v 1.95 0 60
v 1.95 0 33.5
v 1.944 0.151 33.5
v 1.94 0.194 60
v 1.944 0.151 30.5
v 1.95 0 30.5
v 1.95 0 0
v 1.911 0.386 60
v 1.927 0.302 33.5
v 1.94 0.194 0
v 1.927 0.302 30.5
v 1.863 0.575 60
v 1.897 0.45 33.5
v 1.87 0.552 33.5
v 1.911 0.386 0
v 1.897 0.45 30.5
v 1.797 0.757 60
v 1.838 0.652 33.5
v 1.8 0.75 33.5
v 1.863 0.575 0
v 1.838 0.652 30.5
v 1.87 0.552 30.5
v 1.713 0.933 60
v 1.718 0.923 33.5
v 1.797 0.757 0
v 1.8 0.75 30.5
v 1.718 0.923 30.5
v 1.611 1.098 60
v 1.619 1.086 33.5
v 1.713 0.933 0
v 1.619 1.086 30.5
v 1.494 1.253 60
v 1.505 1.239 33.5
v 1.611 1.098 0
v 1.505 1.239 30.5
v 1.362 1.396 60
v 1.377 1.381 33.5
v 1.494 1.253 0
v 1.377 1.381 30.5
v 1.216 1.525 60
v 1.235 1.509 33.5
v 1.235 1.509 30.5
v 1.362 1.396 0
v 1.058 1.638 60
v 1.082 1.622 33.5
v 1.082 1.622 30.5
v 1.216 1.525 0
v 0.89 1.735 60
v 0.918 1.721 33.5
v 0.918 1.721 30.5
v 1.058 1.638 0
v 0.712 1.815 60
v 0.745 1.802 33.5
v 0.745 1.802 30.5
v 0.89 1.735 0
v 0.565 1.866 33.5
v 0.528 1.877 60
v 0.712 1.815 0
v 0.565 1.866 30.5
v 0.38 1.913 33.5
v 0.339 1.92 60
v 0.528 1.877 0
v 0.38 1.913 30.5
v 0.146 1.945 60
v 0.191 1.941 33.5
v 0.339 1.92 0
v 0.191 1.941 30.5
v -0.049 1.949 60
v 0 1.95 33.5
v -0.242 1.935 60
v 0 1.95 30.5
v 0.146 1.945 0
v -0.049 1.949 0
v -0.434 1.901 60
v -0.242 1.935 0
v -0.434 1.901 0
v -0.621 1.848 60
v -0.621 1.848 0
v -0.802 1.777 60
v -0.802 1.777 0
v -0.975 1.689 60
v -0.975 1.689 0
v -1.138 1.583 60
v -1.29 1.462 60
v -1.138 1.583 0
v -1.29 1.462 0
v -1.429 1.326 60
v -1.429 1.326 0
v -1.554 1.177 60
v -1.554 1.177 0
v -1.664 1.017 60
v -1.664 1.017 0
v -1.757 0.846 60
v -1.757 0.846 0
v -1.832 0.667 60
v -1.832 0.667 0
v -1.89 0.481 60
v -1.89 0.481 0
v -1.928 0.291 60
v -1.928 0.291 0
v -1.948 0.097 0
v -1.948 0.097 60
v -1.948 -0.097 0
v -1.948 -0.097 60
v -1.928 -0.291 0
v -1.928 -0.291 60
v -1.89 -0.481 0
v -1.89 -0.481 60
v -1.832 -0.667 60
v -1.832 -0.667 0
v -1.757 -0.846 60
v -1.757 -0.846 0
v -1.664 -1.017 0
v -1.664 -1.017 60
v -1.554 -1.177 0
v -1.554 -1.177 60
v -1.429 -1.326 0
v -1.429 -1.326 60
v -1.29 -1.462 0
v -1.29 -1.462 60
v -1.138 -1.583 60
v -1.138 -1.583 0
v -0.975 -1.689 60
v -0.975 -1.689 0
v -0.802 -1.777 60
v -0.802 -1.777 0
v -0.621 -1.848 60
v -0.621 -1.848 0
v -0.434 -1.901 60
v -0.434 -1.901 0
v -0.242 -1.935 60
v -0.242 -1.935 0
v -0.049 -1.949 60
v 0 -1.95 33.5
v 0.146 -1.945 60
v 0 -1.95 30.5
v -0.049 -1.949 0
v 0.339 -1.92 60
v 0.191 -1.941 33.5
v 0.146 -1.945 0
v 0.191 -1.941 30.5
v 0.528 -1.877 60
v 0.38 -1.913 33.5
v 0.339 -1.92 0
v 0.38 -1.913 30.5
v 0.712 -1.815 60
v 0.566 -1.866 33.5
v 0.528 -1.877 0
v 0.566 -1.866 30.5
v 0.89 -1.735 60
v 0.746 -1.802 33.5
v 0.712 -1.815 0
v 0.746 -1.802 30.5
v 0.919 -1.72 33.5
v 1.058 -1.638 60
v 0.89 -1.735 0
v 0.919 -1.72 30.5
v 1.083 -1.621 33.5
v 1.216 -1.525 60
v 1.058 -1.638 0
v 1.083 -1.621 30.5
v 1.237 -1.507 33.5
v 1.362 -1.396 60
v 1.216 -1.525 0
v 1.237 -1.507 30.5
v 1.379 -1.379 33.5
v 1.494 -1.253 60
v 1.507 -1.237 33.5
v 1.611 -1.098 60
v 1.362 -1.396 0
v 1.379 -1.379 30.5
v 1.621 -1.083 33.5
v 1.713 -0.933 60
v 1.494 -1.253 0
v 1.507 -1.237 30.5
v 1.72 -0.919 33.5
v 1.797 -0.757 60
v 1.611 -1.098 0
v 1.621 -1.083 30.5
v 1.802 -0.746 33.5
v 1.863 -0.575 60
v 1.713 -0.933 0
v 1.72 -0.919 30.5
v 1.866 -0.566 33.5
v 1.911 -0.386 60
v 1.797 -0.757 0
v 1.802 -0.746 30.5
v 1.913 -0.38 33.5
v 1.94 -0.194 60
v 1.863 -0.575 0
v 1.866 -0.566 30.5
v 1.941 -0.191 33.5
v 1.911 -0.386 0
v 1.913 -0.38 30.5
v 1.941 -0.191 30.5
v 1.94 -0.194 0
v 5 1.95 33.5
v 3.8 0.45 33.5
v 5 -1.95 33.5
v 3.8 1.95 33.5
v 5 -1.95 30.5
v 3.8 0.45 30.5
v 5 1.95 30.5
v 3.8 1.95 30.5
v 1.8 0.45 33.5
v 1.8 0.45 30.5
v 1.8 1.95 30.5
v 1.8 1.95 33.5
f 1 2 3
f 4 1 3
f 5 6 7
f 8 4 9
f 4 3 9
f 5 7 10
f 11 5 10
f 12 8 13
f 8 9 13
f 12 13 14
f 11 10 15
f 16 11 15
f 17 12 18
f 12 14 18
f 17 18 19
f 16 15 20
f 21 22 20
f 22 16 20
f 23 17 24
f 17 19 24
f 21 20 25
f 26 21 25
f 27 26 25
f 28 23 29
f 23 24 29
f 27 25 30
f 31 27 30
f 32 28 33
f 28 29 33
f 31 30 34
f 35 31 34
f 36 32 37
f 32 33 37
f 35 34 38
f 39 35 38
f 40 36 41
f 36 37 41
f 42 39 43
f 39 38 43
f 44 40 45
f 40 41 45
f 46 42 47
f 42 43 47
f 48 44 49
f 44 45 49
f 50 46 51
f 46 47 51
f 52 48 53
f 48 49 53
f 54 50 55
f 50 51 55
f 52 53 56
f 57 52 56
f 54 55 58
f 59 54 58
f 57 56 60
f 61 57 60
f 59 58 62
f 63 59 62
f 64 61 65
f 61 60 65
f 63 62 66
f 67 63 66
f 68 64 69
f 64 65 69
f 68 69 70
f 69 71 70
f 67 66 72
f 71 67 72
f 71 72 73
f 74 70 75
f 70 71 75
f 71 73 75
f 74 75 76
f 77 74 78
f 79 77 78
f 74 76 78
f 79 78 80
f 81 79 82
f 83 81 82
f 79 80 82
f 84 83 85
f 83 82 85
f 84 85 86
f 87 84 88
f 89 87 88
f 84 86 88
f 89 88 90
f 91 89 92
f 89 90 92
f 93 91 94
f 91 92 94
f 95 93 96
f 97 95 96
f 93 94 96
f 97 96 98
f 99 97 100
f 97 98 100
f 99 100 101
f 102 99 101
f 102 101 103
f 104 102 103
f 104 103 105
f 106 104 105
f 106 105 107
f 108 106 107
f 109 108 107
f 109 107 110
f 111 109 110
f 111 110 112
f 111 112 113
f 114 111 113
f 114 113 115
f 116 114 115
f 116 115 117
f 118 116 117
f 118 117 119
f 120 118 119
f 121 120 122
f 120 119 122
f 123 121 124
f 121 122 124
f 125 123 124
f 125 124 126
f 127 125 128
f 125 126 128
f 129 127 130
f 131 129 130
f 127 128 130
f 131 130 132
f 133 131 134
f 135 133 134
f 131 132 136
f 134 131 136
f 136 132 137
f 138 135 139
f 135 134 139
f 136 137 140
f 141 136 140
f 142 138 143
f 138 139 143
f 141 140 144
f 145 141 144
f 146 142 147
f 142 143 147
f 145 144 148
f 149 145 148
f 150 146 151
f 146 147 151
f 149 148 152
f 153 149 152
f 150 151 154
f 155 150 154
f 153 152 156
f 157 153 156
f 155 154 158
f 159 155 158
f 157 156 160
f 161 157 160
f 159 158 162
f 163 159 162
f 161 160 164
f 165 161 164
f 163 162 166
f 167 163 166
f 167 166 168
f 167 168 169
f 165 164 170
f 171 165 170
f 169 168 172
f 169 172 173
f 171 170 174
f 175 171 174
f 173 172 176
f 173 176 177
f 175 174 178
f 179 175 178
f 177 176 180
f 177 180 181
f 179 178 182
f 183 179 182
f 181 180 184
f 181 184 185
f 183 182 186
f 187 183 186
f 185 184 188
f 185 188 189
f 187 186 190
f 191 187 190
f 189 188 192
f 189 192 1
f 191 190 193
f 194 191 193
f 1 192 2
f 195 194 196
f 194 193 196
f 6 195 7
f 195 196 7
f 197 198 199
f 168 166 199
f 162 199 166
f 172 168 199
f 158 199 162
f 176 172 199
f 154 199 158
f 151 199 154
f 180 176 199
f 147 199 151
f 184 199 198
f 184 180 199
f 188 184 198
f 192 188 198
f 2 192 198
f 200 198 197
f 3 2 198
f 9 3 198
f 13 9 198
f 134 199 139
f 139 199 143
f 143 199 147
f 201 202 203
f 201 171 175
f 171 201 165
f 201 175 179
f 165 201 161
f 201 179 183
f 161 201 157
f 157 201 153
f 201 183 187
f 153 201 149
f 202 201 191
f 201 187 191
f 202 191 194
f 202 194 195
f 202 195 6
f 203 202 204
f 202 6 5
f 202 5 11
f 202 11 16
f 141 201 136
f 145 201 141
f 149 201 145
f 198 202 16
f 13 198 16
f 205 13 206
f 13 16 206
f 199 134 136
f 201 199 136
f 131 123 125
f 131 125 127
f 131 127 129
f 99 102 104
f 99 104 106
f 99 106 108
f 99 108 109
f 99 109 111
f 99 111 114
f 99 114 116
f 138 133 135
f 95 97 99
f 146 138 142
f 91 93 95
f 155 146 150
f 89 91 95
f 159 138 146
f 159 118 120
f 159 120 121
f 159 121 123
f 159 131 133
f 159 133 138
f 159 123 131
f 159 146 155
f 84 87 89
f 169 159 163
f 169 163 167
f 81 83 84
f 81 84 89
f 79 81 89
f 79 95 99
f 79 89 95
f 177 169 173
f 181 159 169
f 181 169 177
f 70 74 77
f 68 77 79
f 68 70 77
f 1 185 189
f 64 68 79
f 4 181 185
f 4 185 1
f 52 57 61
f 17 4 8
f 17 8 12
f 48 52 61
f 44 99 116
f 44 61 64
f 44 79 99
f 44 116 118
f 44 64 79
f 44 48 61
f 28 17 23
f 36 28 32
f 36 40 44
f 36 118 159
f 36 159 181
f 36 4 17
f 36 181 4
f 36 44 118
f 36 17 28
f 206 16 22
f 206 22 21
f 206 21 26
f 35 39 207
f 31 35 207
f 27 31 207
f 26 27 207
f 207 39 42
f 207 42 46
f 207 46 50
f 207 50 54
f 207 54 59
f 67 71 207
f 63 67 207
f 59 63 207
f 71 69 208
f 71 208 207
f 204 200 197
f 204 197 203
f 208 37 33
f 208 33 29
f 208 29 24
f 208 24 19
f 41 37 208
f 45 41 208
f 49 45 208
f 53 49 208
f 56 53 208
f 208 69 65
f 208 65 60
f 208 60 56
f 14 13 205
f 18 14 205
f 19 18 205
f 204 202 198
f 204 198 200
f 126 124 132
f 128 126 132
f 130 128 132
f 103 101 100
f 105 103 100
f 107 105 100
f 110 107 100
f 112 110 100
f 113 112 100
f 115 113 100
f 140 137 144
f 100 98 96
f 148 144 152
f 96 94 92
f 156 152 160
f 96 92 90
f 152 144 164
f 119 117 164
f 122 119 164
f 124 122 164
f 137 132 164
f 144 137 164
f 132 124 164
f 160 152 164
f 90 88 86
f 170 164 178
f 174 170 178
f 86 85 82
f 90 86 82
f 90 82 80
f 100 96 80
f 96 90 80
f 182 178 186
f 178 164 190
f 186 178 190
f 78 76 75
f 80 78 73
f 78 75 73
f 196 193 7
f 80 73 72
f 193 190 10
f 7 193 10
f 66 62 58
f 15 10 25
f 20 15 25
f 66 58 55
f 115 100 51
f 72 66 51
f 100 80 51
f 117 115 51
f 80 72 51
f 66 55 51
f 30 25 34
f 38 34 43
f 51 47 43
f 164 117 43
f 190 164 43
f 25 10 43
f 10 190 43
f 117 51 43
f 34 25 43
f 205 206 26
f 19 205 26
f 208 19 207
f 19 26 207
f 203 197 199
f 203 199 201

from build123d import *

# Parameters (mm, degrees)
SKETCH_1_R          = 1.95
EXTRUDE_1_DEPTH     = 60
SKETCH1_W           = 3
SKETCH1_H           = 3.9
BOSS_EXTRUDE1_DEPTH = 5
SKETCH2_W           = 2
SKETCH2_H           = 1.5
CUT_EXTRUDE1_DEPTH  = 3


with BuildPart() as part:
    # 草图1 → 凸台-拉伸1 (new body)
    with BuildSketch(Plane.XY):
        Circle(SKETCH_1_R)
    extrude(amount=EXTRUDE_1_DEPTH)

    # Sketch1 → Boss-Extrude1 (add)
    with BuildSketch(Plane(origin=(0, 0, 0), x_dir=(0, 0, -1), z_dir=(1, 0, 0))):
        with Locations((-32, 0)):
            Rectangle(SKETCH1_W, SKETCH1_H)
    extrude(amount=BOSS_EXTRUDE1_DEPTH)

    # Sketch2 → Cut-Extrude1 (cut)
    with BuildSketch(Plane(origin=(0, 0, 30.5), x_dir=(-1, 0, 0), z_dir=(0, 0, -1))):
        with Locations((-2.8, 1.2)):
            Rectangle(SKETCH2_W, SKETCH2_H)
    extrude(amount=-CUT_EXTRUDE1_DEPTH, mode=Mode.SUBTRACT)


solid = part.part
